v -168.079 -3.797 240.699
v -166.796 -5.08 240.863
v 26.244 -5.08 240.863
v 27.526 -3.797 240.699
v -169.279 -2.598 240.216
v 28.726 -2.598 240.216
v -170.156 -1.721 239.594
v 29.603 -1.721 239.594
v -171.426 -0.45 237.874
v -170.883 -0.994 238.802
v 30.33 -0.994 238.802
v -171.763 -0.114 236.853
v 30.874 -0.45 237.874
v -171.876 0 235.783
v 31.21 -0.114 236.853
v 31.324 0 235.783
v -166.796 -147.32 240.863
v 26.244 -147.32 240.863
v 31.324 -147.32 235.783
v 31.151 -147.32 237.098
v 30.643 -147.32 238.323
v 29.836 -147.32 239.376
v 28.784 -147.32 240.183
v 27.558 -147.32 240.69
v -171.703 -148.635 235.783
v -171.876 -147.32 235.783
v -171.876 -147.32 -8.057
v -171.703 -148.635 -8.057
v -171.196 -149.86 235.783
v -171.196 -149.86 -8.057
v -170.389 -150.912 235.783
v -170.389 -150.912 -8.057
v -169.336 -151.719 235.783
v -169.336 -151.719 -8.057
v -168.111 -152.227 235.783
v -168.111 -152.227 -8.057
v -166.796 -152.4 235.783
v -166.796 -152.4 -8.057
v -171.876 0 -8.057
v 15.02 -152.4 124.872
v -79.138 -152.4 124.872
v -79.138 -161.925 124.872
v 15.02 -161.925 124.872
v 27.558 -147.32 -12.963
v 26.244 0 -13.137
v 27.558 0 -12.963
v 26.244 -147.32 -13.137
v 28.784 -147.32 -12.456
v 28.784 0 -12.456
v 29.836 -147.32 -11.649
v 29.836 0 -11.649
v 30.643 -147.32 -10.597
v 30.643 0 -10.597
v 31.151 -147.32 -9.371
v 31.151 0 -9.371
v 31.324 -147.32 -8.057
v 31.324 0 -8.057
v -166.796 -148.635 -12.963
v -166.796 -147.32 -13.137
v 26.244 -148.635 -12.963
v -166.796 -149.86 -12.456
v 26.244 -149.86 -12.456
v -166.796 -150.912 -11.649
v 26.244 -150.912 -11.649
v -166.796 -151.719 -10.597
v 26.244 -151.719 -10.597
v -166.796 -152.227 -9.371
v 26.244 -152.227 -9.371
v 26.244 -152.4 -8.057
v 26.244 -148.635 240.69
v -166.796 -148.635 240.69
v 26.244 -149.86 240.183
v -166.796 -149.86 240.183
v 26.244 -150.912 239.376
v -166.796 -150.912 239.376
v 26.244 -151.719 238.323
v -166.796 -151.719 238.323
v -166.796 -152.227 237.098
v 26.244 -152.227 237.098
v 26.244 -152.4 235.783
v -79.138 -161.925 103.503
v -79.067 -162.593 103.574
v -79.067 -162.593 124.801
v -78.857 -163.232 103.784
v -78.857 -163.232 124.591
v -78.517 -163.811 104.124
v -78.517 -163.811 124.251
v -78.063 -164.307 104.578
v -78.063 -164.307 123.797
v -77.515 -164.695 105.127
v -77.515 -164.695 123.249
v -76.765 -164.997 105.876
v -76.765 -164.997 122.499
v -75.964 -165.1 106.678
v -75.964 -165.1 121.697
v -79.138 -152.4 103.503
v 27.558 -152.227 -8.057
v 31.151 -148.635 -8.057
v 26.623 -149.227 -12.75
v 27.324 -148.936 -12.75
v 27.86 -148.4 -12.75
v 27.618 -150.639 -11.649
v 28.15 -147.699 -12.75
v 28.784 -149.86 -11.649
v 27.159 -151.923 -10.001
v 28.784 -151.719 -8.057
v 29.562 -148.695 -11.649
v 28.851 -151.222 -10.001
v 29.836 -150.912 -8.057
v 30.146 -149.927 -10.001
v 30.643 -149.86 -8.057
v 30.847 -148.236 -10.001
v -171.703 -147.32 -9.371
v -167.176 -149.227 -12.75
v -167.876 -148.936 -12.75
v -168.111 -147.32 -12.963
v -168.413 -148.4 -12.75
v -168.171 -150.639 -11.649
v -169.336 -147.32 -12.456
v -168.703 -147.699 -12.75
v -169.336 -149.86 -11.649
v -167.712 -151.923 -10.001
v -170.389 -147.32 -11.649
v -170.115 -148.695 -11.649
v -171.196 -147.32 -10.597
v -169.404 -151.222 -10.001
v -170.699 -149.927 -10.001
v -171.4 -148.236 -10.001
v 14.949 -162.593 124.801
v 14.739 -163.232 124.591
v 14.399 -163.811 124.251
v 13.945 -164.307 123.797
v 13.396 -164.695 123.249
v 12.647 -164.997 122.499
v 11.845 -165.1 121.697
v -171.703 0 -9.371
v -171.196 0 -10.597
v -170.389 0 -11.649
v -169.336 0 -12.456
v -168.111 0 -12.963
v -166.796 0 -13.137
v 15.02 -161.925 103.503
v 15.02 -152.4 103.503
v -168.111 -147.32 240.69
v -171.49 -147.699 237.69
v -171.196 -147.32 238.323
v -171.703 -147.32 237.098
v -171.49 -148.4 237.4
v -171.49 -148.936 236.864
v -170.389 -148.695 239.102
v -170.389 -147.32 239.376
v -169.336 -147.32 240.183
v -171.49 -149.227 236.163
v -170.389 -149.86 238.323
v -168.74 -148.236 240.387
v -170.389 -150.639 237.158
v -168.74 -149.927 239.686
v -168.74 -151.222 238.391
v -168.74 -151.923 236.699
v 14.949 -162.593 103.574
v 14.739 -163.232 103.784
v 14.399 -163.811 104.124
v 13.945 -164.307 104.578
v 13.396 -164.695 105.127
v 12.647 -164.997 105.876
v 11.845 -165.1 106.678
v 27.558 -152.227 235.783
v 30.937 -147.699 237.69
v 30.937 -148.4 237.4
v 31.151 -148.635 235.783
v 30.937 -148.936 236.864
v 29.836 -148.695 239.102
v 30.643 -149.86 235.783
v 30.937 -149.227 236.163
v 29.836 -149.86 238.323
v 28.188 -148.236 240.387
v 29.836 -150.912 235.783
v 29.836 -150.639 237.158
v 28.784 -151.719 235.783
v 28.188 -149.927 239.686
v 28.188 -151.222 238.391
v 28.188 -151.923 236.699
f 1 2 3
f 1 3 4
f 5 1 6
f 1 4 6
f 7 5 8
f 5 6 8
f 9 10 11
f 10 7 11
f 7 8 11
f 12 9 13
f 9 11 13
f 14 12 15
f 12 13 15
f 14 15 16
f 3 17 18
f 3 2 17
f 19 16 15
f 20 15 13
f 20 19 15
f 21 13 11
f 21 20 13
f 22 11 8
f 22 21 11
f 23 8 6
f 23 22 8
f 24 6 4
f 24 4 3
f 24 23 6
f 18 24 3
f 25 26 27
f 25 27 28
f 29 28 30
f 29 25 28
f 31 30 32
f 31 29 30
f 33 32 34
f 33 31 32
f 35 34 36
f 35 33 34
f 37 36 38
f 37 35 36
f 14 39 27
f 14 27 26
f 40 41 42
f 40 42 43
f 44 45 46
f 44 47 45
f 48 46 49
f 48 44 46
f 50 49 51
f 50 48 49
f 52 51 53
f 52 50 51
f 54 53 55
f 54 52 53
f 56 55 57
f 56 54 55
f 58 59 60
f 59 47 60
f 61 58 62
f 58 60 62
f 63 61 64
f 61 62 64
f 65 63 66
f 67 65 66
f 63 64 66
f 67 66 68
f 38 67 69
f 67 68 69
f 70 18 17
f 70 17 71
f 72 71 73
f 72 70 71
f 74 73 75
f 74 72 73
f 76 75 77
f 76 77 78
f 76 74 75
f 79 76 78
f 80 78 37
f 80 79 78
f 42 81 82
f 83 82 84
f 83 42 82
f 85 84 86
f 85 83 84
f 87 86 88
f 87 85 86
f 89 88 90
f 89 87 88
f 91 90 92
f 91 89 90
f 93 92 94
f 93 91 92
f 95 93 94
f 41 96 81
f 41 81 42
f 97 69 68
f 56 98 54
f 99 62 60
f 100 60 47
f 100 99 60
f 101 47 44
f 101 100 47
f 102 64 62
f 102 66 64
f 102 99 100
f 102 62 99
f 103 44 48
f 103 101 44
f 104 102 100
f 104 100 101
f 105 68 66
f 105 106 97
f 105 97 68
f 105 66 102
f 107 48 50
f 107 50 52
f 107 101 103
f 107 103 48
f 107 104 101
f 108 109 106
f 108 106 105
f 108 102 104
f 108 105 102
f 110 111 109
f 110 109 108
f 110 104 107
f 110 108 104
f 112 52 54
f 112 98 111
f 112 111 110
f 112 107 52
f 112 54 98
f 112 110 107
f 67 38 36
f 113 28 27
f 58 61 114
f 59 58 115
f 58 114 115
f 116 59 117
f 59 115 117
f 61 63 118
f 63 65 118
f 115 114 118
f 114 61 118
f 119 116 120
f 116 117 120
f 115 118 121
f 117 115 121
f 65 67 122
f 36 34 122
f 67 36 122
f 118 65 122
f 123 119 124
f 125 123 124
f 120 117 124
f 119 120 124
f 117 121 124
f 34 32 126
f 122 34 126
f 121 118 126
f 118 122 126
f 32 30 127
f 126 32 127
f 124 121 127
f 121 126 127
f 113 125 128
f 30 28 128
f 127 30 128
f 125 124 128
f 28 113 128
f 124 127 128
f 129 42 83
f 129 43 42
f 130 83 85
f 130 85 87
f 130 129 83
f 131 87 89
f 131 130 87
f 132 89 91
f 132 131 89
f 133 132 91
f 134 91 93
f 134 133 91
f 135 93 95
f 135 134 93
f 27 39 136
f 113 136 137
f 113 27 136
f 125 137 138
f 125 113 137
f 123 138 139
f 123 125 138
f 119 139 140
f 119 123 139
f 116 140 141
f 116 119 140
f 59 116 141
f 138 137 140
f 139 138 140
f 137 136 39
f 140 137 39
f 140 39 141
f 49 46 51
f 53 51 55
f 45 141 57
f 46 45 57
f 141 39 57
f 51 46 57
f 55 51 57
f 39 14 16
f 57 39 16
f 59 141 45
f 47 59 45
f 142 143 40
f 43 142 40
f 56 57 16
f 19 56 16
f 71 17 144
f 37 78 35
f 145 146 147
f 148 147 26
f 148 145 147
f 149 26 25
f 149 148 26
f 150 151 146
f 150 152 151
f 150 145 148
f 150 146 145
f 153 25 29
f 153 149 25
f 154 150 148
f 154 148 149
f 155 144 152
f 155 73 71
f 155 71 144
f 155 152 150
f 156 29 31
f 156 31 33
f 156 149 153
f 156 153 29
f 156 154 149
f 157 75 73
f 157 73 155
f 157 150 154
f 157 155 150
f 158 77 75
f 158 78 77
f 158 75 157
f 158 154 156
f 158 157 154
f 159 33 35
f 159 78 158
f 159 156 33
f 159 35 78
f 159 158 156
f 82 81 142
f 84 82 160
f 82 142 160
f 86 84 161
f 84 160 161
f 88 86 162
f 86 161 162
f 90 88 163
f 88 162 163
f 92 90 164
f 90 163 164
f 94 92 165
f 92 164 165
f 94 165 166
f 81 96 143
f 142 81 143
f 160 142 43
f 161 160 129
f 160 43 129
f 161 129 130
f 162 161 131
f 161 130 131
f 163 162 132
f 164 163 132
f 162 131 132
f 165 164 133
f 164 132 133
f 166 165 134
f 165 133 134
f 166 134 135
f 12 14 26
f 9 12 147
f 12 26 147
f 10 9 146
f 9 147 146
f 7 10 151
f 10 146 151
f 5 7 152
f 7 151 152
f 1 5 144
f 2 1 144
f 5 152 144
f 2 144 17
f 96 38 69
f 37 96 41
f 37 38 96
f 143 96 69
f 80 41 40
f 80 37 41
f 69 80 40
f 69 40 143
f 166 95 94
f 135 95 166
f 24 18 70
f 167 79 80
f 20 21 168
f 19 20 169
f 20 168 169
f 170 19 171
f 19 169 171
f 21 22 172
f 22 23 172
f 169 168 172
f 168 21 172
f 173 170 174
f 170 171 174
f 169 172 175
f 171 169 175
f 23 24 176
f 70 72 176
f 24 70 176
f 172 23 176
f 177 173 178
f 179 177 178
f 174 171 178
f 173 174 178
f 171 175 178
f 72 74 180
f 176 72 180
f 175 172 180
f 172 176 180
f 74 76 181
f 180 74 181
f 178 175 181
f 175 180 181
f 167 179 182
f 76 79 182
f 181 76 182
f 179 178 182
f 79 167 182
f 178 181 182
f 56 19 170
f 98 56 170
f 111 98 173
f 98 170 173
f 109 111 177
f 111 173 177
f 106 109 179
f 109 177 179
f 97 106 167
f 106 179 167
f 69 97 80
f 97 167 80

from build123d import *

# Parameters (mm, degrees)
F0_W     = 203.2
F0_H     = 254
F1_DEPTH = 152.4
F2_R     = 5.08
F3_W     = 94.158622
F3_H     = 21.369308
F4_DEPTH = 12.7
F5_R     = 3.175


with BuildPart() as f1:
    # F0 (on Front) → F1 (new body)
    with BuildSketch(Plane.XZ):
        with Locations((-70.276403, 113.863483)):
            Rectangle(F0_W, F0_H)
    extrude(amount=F1_DEPTH)

    # F2
    f2_edges = [f1.edges().sort_by_distance(p)[0] for p in [
        (-70.276403, -152.4, 240.863483),
        (31.323597, -76.2, 240.863483),
        (-171.876403, -76.2, 240.863483),
        (-70.276403, 0, 240.863483),
        (31.323597, -152.4, 113.863483),
        (-171.876403, -152.4, 113.863483),
        (-70.276403, -152.4, -13.136517),
        (31.323597, -76.2, -13.136517),
        (-171.876403, -76.2, -13.136517),
    ]]
    fillet(f2_edges, radius=F2_R)

    # F3 (on face) → F4 (join)
    with BuildSketch(Plane.XZ.offset(152.4)):
        with Locations((-32.059189, 114.187598)):
            Rectangle(F3_W, F3_H)
    extrude(amount=F4_DEPTH)

    # F5
    f5_edges = [f1.edges().sort_by_distance(p)[0] for p in [
        (-32.059189, -165.1, 103.502944),
        (15.020122, -165.1, 114.187598),
        (-32.059189, -165.1, 124.872252),
        (-79.1385, -165.1, 114.187598),
    ]]
    fillet(f5_edges, radius=F5_R)


solid = f1.part
